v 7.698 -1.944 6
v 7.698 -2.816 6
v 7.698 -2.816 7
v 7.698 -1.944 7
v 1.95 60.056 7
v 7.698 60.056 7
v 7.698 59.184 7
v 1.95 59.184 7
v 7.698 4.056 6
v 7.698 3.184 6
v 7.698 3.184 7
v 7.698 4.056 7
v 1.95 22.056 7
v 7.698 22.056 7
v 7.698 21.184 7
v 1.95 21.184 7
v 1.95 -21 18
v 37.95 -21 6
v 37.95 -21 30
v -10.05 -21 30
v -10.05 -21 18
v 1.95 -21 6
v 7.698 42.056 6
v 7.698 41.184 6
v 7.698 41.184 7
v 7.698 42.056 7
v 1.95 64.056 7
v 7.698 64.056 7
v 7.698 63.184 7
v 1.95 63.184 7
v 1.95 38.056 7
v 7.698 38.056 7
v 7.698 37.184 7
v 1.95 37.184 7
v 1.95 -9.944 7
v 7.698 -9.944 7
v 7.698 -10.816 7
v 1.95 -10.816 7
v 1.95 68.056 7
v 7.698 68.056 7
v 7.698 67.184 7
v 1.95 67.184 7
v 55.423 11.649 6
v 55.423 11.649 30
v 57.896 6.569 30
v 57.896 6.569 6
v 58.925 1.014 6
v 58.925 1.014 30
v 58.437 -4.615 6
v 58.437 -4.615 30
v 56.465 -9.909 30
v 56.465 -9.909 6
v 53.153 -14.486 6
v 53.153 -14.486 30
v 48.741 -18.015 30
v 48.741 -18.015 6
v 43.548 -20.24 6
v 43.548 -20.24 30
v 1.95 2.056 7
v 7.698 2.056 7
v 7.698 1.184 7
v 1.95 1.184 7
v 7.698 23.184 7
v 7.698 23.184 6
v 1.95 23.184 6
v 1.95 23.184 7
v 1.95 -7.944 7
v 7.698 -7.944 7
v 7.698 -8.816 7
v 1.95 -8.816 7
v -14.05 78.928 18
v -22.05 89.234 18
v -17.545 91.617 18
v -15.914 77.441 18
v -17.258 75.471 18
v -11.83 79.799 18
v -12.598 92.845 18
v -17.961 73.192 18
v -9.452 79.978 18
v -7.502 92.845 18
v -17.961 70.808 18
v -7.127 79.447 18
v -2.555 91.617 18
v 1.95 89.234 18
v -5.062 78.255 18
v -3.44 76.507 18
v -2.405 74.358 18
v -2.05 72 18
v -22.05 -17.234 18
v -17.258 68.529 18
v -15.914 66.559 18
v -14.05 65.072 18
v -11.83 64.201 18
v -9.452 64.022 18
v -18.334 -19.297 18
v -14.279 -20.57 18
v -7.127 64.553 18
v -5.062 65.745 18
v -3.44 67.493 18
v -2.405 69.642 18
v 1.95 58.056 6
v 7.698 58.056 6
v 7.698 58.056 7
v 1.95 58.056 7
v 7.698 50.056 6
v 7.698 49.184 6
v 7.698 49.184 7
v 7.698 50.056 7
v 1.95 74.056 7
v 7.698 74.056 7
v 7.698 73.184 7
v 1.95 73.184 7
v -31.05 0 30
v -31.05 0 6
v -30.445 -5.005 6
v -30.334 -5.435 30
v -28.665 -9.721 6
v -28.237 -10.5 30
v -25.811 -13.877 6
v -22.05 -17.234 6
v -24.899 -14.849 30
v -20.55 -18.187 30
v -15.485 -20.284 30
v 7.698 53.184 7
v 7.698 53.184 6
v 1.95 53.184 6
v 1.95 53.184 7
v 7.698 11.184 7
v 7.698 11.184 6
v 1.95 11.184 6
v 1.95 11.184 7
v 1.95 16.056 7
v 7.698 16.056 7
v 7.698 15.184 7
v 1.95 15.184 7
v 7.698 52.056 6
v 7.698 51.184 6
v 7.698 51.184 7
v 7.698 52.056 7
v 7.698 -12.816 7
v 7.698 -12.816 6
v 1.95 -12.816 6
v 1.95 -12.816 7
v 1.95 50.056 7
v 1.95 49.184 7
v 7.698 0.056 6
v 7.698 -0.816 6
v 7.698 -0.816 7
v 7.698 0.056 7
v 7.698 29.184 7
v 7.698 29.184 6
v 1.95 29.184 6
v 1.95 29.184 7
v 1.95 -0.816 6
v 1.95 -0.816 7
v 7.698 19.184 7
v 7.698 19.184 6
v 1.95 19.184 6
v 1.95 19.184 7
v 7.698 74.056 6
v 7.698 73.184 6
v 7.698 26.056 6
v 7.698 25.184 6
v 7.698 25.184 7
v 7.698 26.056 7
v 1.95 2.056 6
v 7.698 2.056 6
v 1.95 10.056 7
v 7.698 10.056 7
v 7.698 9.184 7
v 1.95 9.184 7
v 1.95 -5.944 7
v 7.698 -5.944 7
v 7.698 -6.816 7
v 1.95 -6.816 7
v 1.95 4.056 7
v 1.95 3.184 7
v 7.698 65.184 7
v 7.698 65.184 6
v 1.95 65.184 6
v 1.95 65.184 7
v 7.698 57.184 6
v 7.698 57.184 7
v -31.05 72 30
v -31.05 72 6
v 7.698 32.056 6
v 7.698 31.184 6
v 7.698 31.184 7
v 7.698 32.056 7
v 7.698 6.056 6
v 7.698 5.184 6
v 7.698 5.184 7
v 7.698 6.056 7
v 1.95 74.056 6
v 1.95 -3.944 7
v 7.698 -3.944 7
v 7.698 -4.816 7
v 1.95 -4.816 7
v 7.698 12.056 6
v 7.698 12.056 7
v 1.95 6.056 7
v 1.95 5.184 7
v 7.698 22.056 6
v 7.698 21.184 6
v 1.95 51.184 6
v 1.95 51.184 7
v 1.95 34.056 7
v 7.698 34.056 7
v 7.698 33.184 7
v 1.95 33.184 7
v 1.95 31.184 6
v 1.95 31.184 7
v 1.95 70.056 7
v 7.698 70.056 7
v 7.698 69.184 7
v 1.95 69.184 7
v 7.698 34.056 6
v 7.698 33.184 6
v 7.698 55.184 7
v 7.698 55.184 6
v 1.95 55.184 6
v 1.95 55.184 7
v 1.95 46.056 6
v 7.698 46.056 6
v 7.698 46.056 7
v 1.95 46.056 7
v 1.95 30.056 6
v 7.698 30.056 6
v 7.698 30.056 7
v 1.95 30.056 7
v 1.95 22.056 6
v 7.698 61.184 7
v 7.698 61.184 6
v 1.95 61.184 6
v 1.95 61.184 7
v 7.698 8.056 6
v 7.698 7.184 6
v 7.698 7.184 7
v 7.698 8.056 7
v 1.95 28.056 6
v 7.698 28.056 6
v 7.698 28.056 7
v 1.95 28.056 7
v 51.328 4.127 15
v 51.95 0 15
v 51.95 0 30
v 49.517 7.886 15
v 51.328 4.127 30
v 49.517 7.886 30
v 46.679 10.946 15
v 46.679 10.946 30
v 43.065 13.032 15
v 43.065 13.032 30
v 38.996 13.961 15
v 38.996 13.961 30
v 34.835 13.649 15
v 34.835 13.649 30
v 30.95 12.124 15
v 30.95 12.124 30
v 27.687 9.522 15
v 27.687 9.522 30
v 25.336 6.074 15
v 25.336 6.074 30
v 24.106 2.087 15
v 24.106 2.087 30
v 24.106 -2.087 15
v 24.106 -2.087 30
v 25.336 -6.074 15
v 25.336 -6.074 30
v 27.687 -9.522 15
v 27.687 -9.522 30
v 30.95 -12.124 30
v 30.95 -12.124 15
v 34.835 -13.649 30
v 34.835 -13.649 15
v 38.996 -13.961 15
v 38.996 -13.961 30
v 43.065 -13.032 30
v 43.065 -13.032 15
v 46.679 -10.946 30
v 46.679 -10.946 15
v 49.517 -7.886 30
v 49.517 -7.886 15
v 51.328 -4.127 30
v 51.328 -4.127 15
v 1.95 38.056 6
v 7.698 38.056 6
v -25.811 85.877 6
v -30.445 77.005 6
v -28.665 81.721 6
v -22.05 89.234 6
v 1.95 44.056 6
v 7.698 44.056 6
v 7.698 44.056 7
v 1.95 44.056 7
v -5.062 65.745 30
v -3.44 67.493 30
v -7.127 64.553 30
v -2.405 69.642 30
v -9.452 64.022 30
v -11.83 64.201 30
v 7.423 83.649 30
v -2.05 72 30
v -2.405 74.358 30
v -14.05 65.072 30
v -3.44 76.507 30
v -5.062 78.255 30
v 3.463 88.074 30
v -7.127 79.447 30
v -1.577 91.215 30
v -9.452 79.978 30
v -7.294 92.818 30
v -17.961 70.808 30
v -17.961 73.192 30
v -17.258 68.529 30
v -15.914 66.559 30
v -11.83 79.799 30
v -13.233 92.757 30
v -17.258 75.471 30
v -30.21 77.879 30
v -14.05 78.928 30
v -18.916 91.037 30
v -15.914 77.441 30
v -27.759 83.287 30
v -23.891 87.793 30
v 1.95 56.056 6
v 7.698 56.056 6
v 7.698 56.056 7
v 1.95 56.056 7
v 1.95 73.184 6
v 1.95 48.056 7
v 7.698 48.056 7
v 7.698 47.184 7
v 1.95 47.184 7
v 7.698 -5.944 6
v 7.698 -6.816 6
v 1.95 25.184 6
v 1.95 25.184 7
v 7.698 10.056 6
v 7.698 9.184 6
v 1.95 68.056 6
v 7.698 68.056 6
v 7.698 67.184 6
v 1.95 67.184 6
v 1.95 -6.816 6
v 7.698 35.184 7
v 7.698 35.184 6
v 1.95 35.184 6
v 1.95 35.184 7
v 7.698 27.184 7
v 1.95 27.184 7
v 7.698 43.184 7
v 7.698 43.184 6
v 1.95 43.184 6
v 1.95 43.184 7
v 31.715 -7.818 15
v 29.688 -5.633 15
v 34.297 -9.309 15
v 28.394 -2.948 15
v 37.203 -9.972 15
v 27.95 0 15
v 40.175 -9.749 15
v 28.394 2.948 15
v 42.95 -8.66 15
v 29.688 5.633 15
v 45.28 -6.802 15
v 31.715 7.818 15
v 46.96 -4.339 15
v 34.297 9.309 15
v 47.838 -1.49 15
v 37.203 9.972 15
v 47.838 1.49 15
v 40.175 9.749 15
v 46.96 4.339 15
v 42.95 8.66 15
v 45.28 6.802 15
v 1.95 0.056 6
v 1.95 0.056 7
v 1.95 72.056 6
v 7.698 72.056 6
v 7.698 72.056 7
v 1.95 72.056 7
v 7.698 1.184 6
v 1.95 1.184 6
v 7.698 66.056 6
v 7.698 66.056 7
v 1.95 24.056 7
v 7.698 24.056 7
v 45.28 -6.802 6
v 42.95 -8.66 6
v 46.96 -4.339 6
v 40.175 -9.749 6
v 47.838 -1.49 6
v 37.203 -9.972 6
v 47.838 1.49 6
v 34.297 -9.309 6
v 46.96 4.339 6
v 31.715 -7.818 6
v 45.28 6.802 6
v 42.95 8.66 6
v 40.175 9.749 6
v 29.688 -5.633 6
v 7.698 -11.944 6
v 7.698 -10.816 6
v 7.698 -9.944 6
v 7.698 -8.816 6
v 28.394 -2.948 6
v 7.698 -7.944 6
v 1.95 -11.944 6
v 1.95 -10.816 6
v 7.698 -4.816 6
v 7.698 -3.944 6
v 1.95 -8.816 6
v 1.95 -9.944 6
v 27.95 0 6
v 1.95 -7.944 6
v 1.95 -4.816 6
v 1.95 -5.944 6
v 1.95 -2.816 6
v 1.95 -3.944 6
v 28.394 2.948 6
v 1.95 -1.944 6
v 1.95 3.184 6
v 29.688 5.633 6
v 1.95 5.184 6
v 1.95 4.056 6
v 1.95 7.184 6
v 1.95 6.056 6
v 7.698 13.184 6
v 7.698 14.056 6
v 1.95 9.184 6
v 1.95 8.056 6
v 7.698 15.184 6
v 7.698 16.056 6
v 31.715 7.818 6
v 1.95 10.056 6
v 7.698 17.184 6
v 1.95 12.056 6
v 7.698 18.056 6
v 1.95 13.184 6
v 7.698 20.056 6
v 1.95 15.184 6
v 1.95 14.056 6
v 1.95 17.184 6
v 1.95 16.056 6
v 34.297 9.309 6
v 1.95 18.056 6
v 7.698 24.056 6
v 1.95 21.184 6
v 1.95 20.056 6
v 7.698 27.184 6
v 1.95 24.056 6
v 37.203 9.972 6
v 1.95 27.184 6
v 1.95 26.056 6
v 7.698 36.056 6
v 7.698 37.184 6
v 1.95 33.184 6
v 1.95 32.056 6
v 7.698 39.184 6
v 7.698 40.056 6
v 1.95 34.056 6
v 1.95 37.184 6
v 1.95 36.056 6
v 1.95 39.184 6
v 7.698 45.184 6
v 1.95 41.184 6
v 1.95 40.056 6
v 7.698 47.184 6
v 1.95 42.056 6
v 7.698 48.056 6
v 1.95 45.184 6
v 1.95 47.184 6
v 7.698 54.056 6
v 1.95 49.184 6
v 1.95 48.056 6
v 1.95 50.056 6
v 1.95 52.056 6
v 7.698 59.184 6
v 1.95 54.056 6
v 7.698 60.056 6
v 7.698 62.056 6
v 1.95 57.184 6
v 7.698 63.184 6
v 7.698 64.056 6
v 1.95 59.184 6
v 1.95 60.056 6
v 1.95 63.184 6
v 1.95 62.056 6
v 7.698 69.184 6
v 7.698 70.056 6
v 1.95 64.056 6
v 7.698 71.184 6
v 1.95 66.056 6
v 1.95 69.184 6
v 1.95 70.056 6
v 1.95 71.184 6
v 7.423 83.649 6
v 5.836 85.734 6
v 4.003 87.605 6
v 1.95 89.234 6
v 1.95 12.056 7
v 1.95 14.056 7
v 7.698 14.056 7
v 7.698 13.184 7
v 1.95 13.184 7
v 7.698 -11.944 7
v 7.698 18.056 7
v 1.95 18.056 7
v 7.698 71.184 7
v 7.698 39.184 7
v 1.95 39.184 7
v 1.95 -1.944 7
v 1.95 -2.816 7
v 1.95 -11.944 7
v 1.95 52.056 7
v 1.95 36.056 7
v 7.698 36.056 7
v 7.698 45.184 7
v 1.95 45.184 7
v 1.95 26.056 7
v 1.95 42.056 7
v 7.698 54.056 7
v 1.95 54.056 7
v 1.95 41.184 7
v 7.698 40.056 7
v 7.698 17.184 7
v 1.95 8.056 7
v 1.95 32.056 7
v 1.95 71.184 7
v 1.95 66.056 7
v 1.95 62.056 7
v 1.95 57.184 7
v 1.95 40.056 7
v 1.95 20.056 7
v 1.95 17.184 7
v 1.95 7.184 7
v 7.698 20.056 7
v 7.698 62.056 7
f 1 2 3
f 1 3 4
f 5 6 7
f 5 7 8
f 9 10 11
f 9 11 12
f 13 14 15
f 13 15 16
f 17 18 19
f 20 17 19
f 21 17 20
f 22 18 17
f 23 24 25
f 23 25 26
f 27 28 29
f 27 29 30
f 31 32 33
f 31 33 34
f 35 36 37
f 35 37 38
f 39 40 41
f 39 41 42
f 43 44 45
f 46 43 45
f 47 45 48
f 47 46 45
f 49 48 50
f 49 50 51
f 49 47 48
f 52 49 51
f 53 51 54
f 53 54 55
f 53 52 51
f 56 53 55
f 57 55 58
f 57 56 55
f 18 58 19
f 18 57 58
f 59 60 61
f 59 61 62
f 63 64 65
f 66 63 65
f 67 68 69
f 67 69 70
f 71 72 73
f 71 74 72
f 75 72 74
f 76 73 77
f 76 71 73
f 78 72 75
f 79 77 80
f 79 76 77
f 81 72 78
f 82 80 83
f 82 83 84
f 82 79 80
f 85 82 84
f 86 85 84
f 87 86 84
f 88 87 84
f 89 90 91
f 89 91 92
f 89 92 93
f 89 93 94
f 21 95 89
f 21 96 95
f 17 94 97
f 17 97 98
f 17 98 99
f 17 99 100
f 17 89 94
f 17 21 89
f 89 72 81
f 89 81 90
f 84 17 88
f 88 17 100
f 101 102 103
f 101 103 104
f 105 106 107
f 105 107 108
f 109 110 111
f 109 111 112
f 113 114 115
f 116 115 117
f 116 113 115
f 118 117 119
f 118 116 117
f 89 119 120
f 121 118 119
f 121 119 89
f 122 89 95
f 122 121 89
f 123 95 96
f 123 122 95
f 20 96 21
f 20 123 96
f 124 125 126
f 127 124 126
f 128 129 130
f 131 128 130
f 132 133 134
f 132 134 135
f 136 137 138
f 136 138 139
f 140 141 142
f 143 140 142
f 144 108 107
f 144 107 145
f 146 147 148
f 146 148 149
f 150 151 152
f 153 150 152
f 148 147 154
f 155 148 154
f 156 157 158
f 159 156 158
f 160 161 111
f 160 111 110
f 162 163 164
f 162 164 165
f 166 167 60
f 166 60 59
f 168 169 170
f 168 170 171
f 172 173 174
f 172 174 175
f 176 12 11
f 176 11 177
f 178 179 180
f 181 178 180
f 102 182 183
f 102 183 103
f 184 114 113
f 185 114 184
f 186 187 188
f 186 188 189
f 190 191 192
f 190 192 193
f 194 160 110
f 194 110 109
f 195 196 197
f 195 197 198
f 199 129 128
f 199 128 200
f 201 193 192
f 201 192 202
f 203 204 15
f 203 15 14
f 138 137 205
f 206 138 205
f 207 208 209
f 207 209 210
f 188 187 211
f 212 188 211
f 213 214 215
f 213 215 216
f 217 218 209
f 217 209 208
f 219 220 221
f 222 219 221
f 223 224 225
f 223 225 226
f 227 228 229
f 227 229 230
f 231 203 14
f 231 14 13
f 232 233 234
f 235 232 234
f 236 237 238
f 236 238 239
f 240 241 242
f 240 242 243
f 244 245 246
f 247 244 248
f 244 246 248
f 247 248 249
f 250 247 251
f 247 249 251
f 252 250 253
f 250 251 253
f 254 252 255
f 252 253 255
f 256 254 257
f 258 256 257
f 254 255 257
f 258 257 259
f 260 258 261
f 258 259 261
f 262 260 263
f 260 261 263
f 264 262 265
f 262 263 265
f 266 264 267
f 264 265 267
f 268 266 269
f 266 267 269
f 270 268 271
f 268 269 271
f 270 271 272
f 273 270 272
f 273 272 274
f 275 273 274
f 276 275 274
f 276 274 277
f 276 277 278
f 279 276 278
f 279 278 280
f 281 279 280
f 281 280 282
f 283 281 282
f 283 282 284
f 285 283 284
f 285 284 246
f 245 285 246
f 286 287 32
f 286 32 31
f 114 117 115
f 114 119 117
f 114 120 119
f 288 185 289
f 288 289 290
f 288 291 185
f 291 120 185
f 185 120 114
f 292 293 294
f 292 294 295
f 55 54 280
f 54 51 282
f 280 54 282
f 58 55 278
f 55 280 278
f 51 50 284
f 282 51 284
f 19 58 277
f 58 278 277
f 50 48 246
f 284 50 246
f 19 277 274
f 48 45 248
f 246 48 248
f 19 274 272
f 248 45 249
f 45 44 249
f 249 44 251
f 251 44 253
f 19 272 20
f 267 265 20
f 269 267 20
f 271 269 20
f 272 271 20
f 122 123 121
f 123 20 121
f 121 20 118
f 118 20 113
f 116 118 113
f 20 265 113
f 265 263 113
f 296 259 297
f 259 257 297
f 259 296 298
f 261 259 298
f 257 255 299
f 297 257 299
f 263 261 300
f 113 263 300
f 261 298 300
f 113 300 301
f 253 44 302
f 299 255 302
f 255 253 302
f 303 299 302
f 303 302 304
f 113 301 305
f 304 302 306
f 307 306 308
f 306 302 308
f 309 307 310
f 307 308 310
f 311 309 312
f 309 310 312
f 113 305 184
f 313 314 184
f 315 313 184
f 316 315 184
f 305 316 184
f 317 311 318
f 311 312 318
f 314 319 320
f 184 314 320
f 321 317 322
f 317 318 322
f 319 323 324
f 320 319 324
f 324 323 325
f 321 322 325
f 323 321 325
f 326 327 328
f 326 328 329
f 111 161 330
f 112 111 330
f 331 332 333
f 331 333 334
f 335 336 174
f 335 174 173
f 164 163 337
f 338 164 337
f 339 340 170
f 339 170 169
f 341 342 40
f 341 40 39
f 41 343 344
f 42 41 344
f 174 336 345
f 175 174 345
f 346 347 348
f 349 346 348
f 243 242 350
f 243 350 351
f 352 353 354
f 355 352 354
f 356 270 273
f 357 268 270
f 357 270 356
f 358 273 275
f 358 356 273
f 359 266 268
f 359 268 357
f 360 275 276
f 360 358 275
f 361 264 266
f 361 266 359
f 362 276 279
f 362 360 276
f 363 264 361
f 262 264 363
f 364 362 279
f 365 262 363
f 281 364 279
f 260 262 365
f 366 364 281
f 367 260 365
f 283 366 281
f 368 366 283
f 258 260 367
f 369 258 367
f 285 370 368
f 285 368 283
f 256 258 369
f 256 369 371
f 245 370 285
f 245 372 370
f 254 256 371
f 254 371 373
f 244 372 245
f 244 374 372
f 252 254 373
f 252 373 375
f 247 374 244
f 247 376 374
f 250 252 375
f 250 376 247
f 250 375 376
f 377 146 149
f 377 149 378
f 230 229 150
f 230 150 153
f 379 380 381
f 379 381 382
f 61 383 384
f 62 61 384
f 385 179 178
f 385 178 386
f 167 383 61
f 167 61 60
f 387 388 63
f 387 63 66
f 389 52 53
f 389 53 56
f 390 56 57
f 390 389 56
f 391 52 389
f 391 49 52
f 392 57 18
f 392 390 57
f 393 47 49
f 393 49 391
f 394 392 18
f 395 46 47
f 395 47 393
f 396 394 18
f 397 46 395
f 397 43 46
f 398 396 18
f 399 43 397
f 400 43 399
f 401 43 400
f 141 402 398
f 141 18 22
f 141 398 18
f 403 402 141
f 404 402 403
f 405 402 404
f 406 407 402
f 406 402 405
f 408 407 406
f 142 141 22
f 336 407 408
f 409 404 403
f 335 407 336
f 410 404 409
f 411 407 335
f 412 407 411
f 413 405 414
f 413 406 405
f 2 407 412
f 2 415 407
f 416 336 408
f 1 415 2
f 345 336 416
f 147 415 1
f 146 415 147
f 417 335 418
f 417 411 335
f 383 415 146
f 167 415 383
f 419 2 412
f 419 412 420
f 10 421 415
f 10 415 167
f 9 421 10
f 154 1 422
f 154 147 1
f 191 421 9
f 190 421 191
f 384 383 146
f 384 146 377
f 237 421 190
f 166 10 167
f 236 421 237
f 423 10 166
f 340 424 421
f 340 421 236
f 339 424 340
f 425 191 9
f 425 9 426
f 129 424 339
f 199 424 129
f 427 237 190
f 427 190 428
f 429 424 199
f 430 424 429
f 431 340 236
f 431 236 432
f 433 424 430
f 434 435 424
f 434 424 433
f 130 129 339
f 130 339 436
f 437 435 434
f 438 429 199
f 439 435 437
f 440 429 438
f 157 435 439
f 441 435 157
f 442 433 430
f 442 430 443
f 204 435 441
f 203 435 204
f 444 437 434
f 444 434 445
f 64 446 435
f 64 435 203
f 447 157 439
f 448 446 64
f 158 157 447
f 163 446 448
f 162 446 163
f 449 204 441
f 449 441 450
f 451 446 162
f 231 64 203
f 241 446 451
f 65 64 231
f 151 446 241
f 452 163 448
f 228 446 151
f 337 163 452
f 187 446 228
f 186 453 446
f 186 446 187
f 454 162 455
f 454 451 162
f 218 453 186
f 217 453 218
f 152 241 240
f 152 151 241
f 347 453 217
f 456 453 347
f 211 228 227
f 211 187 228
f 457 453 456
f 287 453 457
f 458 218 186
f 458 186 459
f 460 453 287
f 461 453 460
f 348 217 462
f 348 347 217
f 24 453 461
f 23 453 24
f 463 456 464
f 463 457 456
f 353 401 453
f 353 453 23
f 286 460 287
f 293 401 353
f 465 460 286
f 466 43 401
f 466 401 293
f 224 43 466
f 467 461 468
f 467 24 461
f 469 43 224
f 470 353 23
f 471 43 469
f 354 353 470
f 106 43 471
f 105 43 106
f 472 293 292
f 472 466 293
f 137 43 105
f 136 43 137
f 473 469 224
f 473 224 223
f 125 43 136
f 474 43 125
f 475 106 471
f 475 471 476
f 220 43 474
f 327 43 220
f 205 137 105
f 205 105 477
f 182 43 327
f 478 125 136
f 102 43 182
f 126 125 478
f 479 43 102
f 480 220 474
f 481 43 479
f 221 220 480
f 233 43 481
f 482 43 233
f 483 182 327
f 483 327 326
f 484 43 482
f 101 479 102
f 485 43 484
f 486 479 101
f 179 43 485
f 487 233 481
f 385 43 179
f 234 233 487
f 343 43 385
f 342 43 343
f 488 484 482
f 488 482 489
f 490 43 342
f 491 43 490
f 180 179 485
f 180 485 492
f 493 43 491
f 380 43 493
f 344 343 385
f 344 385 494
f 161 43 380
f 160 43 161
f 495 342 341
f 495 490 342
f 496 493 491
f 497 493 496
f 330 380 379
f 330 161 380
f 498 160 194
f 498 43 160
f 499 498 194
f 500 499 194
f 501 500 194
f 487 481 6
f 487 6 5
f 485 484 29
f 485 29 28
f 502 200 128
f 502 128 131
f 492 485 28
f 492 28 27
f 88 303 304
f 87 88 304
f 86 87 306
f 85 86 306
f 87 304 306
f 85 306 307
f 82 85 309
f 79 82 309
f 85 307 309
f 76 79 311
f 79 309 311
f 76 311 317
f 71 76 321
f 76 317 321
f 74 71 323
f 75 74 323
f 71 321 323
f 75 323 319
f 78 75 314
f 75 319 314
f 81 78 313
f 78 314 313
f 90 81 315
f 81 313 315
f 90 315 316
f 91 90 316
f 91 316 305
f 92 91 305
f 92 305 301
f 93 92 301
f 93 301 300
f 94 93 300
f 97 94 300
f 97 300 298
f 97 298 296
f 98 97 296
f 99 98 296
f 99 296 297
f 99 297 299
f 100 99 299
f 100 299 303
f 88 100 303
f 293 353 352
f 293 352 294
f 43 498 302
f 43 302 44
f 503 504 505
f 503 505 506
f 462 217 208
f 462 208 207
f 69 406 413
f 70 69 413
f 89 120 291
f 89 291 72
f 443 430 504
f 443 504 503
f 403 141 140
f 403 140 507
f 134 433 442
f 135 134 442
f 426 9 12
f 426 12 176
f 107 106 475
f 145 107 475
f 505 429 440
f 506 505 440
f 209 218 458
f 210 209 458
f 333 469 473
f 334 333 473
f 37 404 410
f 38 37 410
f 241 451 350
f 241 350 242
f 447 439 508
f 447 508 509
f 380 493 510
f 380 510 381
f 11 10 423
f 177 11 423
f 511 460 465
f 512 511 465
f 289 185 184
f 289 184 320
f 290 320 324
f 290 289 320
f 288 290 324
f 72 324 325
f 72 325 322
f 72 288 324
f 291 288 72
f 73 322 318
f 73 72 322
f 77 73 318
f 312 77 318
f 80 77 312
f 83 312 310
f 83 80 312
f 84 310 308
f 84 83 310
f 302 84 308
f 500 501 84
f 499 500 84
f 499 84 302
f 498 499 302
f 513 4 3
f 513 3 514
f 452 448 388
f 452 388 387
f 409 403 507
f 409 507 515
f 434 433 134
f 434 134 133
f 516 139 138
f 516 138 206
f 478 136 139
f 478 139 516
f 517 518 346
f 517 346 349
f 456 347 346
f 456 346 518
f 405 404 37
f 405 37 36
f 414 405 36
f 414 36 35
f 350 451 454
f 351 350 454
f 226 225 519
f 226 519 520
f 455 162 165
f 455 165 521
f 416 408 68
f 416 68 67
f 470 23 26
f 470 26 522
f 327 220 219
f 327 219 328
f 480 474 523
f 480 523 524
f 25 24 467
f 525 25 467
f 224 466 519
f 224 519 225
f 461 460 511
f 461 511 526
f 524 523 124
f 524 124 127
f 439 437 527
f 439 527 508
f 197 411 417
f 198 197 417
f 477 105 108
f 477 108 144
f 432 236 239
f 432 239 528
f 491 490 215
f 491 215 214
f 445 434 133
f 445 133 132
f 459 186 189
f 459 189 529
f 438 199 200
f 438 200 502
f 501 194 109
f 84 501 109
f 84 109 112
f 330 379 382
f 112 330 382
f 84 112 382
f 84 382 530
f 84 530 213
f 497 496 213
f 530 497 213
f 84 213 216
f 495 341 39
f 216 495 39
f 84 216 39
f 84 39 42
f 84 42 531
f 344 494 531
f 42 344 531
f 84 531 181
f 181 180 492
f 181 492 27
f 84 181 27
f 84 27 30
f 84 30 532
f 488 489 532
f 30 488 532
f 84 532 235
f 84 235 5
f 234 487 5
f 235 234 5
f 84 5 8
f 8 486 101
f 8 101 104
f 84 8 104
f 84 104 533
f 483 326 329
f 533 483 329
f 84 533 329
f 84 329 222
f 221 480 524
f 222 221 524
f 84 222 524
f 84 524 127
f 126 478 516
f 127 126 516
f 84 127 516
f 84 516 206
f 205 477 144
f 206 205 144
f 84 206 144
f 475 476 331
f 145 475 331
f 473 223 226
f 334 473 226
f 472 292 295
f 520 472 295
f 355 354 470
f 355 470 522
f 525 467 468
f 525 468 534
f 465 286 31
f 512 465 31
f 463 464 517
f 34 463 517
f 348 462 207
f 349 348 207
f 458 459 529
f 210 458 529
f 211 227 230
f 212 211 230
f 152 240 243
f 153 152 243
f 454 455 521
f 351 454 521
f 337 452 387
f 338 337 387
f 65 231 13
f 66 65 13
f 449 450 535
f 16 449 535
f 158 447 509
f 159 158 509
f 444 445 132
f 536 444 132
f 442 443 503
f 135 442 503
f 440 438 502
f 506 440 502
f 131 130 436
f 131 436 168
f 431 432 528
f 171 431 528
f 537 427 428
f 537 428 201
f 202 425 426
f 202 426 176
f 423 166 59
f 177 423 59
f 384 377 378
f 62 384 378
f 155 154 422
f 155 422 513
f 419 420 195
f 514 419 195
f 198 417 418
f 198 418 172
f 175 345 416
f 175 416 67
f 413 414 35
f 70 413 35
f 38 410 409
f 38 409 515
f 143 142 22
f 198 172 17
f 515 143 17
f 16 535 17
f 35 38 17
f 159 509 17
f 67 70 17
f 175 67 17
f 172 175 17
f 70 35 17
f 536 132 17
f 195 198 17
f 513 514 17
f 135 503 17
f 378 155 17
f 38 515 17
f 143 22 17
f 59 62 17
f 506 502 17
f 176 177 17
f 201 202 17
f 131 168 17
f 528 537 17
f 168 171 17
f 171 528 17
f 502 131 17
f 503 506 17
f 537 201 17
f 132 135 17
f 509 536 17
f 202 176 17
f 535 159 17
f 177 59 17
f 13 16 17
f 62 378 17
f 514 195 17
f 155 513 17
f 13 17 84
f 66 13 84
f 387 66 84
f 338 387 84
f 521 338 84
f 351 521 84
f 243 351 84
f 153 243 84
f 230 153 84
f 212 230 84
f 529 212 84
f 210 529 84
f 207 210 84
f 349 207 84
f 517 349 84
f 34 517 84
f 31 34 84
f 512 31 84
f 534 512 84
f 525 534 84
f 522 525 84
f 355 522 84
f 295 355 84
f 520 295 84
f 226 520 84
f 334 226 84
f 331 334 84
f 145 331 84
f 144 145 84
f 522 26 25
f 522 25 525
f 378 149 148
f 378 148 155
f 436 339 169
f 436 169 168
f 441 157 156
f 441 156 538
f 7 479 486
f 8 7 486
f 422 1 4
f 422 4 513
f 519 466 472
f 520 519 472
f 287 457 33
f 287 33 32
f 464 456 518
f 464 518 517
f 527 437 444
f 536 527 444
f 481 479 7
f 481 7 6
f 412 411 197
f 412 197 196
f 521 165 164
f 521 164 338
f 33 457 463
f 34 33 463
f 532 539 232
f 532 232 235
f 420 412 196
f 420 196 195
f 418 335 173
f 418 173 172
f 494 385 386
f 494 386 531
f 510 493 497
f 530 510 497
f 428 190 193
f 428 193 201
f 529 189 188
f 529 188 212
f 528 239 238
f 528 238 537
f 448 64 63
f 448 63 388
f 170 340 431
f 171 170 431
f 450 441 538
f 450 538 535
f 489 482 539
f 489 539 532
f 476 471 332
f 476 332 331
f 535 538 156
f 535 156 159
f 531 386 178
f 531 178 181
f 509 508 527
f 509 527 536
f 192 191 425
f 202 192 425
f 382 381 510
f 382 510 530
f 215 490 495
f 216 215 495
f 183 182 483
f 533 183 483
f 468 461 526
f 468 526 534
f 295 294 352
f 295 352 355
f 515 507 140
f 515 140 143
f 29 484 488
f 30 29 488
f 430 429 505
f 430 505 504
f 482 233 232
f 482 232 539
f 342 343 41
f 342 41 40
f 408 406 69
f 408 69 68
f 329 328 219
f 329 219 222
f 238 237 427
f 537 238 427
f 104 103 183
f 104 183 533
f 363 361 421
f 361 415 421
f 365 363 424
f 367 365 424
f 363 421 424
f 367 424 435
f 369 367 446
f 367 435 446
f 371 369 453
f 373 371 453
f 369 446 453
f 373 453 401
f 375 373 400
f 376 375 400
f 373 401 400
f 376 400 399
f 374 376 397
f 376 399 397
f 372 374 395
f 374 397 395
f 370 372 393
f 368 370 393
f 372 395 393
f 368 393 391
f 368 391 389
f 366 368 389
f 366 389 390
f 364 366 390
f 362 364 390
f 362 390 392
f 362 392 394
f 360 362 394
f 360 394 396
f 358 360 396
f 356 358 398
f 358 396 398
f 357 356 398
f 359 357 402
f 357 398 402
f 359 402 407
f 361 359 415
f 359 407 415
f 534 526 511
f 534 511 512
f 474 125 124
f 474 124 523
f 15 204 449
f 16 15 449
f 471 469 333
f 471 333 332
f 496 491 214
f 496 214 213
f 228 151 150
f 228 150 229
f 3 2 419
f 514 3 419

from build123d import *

# Parameters (mm, degrees)
EXTRUSION1_DEPTH                 = 24
ENL_V_MAT_EXTRU_1_REACH          = 133.799
ESQUISSE2_W                      = 24
ESQUISSE2_H                      = 12
DIAM_TRE_DU_PER_AGE_M16_0_16_1_D = 16
PER_AGE1_D                       = 20
PER_AGE1_CBORE_D                 = 28
PER_AGE1_CBORE_DEPTH             = 15
CONG_1_R                         = 21
ESQUISSE7_W                      = 5.748189094
ESQUISSE7_H                      = 0.872373353
ENL_V_MAT_EXTRU_2_DEPTH          = 1
R_P_TITION_LIN_AIRE1_COUNT       = 44
R_P_TITION_LIN_AIRE1_PITCH       = 2


with BuildPart() as part:
    # Esquisse1 → Extrusion1 (new body)
    with BuildSketch(Plane(origin=(0, 0, 6), x_dir=(-1, 0, 0), z_dir=(0, 0, -1))):
        with BuildLine():
            Line((31.050048828, -21), (31.050048828, 72))
            ThreePointArc((31.050048828, 72), (16.135515951, 92.098932556), (-7.423007353, 83.648704121))
            Line((-7.423007353, 83.648704121), (-55.423007353, 11.648704121))
            ThreePointArc((-55.423007353, 11.648704121), (-56.465117746, -9.909016436), (-37.949951172, -21))
            Line((-37.949951172, -21), (31.050048828, -21))
        make_face()
    extrude(amount=-EXTRUSION1_DEPTH)

    # Esquisse2 → Enlèv. mat.-Extru.1 (cut, up to next)
    with BuildSketch(Plane.XZ.offset(21), mode=Mode.PRIVATE) as enl_v_mat_extru_1_sk1:
        with Locations((-10.050048828, 12)):
            Rectangle(ESQUISSE2_W, ESQUISSE2_H)
    enl_v_mat_extru_1_tool1 = extrude(enl_v_mat_extru_1_sk1.sketch, amount=-ENL_V_MAT_EXTRU_1_REACH, mode=Mode.PRIVATE) & part.part
    add(enl_v_mat_extru_1_tool1.solids().sort_by_distance((-10.050049, -21, 12))[0], mode=Mode.SUBTRACT)

    # Diamètre du perçage M16.0 (16)1 (through all)
    with Locations(Plane(origin=(0, 0, 18), x_dir=(-1, 0, 0), z_dir=(0, 0, -1))):
        with Locations((10.050048828, 72)):
            Hole(DIAM_TRE_DU_PER_AGE_M16_0_16_1_D / 2)

    # Perçage1 (through all)
    with Locations(Plane.XY.offset(30)):
        with Locations((37.949951172, 0)):
            CounterBoreHole(PER_AGE1_D / 2, PER_AGE1_CBORE_D / 2, PER_AGE1_CBORE_DEPTH)

    # Congé1
    cong_1_edges = [part.edges().sort_by_distance(p)[0] for p in [
        (-31.050048828, -21, 18),
    ]]
    fillet(cong_1_edges, radius=CONG_1_R)

    # Esquisse7 → Enlèv. mat.-Extru.2 (cut)
    with BuildSketch(Plane(origin=(0, 0, 6), x_dir=(-1, 0, 0), z_dir=(0, 0, -1))):
        with Locations((-4.824045719, 73.61986696)):
            Rectangle(ESQUISSE7_W, ESQUISSE7_H)
    enl_v_mat_extru_2 = extrude(amount=-ENL_V_MAT_EXTRU_2_DEPTH, mode=Mode.SUBTRACT)

    # Répétition linéaire1: Enlèv. mat.-Extru.2 ×44
    with Locations(*[(0, -i * R_P_TITION_LIN_AIRE1_PITCH, 0) for i in range(1, R_P_TITION_LIN_AIRE1_COUNT)]):
        add(enl_v_mat_extru_2, mode=Mode.SUBTRACT)


solid = part.part
